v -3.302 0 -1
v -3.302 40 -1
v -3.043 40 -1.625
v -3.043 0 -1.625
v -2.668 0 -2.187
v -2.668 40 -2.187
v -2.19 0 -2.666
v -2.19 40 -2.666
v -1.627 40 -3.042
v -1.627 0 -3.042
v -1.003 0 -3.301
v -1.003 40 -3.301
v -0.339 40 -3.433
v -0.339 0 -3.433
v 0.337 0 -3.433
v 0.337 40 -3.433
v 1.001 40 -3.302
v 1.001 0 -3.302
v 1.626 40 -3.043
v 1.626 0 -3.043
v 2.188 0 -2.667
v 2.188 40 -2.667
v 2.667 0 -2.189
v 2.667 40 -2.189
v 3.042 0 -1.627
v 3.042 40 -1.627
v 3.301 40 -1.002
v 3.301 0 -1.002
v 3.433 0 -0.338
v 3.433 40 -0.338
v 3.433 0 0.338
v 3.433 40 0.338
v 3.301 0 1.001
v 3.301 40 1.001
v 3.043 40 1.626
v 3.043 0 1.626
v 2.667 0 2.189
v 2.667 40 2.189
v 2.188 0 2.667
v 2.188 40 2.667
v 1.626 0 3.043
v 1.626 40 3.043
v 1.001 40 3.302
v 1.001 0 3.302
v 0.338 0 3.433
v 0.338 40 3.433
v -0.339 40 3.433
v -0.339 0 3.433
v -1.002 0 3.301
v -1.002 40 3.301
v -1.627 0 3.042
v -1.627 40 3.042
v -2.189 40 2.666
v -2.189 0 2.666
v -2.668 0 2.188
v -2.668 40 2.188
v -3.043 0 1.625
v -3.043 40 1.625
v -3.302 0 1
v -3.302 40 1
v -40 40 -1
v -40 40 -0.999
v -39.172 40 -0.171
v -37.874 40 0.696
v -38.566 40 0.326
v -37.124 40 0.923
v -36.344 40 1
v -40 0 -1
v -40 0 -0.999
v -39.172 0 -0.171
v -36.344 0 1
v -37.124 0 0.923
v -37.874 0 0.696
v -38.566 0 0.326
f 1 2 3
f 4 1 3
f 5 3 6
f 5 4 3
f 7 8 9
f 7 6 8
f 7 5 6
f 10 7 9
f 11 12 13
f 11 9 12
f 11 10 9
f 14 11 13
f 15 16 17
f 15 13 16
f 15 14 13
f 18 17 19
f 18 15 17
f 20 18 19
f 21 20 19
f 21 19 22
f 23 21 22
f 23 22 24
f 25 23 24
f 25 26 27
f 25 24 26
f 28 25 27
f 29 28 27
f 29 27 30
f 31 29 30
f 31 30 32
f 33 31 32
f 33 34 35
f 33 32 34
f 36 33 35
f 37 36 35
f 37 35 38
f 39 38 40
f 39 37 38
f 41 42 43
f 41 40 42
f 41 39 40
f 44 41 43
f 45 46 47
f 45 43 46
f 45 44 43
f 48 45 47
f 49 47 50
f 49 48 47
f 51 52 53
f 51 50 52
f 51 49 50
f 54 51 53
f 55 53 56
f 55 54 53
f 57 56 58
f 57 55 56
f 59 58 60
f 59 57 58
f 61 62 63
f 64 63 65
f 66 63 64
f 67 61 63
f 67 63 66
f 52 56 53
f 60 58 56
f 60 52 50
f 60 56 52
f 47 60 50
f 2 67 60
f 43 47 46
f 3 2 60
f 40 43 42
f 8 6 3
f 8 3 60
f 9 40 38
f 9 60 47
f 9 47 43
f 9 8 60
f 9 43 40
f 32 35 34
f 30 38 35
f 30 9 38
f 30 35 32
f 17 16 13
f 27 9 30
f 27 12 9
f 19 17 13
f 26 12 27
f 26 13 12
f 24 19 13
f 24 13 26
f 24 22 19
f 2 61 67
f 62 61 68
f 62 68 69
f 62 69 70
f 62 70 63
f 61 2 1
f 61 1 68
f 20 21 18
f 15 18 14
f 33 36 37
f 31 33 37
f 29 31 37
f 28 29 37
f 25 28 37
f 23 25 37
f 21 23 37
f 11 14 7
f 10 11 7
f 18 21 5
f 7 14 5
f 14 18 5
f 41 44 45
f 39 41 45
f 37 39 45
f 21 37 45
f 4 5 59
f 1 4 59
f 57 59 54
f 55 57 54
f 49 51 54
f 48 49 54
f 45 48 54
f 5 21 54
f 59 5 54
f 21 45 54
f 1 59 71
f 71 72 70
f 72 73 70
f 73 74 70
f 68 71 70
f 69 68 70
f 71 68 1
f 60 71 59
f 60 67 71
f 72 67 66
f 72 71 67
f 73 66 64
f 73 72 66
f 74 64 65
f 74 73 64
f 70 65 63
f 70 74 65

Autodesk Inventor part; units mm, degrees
ref_plane "YZ Plane" through (0, 0, 0) normal (1, 0, 0) x (0, 1, 0)
ref_plane "XZ Plane" through (0, 0, 0) normal (0, 1, 0) x (-1, 0, 0)
ref_plane "XY Plane" through (0, 0, 0) normal (0, 0, 1) x (1, 0, 0)
sketch "Sketch1" plane through (0, 0, 0) normal (0, 1, 0) x (-1, 0, 0)
  point P0 (0, 0)
sketch "Sketch2" plane through (0, 0, 0) normal (0, 1, 0) x (-1, 0, 0)
  circle A0 centre (0, 0) radius 3.45
  dimension "d0" = 6.9
extrude "Extrusion1" add sketch "Sketch2" along normal blind 40
sketch "Sketch3" plane through (0, 40, 0) normal (0, 1, 0) x (1, 0, 0)
  line L0 (0, 0.9998) -> (-40, 0.9998)
  line L1 (-40, 0.9998) -> (-40, -1.0002)
  line L2 (-40, -1.0002) -> (0, -1.0002)
  line L3 (0, -1.0002) -> (0, 0.9998)
  point P0 (0, 0)
  dimension "d3" = 40
  dimension "d4" = 2
extrude "Extrusion2" add sketch "Sketch3" against normal blind 40
chamfer "Chamfer1" distance 2 angle 45 1 edges at (-40, 20, 1.0002)
fillet "Fillet1" radius 4 1 edges at (-38.0005, 20, 1.0002)
properties part number "scoop"
